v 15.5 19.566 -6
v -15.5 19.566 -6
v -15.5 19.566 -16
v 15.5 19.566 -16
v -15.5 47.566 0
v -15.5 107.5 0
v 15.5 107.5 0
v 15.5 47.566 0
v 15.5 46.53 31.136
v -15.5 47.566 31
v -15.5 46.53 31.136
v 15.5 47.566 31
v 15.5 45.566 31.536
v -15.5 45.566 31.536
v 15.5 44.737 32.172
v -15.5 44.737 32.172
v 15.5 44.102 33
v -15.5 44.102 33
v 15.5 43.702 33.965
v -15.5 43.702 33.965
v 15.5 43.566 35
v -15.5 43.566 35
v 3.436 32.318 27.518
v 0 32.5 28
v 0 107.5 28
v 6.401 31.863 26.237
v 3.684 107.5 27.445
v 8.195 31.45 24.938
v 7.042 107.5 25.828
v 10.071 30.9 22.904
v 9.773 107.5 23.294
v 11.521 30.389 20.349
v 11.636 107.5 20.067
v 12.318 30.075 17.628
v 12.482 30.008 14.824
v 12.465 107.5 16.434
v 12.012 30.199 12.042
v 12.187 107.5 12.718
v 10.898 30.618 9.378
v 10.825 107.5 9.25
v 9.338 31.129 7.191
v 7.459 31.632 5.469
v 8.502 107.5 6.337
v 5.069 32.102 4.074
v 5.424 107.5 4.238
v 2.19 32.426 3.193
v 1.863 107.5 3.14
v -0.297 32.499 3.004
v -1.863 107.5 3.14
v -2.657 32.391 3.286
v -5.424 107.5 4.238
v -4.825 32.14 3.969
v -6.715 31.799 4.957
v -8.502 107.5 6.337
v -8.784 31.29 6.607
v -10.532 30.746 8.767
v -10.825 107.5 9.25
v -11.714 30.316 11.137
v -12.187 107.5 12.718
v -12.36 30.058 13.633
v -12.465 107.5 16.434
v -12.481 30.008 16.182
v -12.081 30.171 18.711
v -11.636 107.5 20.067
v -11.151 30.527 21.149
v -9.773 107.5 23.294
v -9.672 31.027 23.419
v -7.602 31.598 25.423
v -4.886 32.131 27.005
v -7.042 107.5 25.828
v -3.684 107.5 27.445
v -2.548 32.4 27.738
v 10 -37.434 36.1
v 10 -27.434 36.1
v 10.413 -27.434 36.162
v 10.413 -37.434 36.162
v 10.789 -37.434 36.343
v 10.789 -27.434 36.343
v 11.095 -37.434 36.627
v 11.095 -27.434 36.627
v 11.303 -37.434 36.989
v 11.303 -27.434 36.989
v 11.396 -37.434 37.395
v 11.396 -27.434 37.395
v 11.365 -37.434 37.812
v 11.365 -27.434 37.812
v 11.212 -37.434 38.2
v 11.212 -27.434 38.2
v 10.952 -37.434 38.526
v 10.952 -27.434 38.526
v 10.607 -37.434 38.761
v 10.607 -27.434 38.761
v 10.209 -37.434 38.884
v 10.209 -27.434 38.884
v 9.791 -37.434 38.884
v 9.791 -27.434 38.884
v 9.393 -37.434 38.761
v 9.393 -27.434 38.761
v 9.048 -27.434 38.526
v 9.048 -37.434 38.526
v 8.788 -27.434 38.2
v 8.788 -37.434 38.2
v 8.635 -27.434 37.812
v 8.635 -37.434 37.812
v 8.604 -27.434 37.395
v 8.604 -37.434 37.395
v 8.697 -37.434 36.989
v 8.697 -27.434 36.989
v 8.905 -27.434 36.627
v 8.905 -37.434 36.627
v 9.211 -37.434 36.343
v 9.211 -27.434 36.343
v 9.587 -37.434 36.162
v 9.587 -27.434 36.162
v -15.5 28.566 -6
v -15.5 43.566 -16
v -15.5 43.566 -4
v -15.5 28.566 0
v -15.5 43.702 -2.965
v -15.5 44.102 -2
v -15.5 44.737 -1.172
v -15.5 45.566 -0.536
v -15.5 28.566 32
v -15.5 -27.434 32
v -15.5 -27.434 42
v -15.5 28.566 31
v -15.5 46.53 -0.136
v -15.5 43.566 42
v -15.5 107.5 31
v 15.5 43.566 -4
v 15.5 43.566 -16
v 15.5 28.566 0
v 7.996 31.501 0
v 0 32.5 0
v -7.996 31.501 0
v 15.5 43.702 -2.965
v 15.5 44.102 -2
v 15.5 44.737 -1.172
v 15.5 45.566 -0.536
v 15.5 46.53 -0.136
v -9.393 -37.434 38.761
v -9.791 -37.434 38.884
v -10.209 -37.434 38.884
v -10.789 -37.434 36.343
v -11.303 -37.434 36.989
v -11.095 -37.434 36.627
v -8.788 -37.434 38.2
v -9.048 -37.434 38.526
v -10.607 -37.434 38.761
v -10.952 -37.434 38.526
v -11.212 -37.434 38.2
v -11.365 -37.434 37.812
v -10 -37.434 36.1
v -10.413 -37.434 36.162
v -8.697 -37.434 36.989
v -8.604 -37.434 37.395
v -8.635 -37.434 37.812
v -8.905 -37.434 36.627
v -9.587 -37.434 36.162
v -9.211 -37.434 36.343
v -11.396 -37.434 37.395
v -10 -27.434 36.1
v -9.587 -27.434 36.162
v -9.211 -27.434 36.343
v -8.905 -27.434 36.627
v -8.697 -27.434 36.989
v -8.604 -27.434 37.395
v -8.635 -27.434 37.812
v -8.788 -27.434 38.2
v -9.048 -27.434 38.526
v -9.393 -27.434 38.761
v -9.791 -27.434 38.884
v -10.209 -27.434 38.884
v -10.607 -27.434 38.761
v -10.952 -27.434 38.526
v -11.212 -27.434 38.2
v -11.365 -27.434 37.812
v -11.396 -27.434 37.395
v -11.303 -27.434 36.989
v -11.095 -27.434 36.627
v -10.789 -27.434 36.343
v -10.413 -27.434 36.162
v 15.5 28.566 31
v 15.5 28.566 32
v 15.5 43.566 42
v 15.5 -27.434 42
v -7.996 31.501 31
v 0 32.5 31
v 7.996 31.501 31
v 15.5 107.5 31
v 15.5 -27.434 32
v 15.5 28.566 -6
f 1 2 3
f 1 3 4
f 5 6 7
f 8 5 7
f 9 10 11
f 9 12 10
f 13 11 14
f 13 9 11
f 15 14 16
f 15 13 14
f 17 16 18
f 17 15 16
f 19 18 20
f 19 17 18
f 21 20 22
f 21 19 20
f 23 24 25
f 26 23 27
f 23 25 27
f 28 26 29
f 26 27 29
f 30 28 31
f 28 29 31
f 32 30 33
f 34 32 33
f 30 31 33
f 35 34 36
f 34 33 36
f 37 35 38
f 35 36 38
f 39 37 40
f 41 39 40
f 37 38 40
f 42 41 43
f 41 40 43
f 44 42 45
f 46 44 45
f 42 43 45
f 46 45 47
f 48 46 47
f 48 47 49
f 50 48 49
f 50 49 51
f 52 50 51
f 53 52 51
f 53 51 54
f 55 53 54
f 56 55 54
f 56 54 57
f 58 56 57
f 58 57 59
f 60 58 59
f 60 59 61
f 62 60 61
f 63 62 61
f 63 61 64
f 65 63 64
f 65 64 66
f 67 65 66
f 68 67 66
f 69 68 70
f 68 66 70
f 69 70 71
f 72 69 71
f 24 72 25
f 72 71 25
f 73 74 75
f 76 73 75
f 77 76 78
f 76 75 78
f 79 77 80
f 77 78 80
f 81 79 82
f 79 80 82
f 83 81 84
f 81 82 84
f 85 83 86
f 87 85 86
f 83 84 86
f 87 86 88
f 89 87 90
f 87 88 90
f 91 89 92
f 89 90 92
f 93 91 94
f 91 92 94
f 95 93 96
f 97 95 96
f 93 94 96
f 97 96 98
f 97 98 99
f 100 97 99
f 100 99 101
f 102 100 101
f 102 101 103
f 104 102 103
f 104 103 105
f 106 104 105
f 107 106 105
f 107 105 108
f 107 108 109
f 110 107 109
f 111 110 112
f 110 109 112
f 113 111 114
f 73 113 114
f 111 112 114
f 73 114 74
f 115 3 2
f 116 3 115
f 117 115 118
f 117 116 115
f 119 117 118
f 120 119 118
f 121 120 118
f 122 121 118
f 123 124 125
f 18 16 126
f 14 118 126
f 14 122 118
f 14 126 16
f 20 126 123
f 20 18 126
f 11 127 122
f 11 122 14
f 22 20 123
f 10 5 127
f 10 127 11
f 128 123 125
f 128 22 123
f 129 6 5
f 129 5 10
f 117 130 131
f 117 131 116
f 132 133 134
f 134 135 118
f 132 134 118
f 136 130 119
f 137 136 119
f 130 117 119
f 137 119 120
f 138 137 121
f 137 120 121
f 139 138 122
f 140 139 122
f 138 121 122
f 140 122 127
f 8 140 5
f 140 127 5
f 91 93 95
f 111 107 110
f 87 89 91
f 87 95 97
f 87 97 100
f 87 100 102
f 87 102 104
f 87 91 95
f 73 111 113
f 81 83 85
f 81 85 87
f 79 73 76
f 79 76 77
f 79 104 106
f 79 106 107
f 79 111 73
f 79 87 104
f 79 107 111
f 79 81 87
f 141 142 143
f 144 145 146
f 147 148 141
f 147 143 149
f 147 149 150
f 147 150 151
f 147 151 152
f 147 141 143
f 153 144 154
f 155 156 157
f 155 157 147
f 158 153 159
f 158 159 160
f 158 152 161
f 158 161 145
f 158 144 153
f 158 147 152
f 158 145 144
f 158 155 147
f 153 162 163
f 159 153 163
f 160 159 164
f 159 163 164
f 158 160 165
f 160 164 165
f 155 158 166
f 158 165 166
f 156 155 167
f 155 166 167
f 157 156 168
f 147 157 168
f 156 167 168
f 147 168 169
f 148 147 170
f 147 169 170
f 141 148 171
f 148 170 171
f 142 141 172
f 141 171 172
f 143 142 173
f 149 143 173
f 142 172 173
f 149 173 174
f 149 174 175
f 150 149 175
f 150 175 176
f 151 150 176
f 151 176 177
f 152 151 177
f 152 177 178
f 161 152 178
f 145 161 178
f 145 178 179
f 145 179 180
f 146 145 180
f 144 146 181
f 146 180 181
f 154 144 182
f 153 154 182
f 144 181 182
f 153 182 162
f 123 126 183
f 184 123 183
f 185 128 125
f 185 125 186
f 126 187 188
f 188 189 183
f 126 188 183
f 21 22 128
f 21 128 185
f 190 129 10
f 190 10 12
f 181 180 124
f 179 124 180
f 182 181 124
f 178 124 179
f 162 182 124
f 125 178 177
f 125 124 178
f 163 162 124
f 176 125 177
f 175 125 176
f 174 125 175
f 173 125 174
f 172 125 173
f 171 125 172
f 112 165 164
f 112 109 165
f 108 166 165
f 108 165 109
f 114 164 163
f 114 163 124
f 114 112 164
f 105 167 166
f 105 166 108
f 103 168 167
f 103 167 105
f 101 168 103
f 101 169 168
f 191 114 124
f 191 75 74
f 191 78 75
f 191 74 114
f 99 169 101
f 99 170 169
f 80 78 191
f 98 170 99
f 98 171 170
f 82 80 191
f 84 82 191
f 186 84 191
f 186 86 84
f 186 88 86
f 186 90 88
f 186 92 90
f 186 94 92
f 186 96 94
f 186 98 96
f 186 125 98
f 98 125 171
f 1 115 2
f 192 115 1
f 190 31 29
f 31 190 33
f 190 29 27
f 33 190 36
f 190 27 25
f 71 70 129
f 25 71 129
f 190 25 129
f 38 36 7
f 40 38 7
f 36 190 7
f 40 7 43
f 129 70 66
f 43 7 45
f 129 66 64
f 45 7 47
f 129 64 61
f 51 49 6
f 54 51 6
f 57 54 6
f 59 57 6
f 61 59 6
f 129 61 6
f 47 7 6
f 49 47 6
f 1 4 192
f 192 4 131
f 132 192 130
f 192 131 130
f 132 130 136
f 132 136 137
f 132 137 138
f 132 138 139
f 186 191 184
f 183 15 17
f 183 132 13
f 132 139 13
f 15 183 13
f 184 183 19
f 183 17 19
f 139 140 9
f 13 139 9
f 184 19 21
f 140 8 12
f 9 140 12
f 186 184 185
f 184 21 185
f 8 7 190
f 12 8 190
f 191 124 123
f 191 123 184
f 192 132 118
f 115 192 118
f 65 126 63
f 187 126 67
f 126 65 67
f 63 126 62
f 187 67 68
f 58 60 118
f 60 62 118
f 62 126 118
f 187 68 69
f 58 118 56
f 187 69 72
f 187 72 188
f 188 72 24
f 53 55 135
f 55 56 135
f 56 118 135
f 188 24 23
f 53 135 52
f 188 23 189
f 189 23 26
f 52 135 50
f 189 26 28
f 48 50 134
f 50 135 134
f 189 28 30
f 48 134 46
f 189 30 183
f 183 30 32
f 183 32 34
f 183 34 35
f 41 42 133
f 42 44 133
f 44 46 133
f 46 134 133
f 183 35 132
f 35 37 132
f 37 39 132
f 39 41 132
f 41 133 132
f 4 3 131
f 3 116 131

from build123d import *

# Parameters (mm, degrees)
BOSS_EXTRUDE1_DEPTH = 31
SKETCH3_R           = 12.5
CUT_EXTRUDE1_DEPTH  = 87.208303263
SKETCH4_W           = 31
SKETCH4_H           = 15
BOSS_EXTRUDE2_DEPTH = 11
SKETCH5_W           = 31
SKETCH5_H           = 10
BOSS_EXTRUDE3_DEPTH = 56
SKETCH6_R           = 1.4
BOSS_EXTRUDE4_DEPTH = 10
SKETCH7_W           = 31
SKETCH7_H           = 15
BOSS_EXTRUDE5_DEPTH = 16
SKETCH8_W           = 31
SKETCH8_H           = 10
BOSS_EXTRUDE6_DEPTH = 9
FILLET1_R           = 4


with BuildPart() as part:
    # Sketch1 → Boss-Extrude1 (new body)
    with BuildSketch(Plane.XY):
        with BuildLine():
            Line((-15.5, 107.5), (-15.5, 28.565713714))
            ThreePointArc((-15.5, 28.565713714), (0, 32.5), (15.5, 28.565713714))
            Line((15.5, 28.565713714), (15.5, 107.5))
            Line((15.5, 107.5), (-15.5, 107.5))
        make_face()
    extrude(amount=BOSS_EXTRUDE1_DEPTH)

    # Sketch3 → Cut-Extrude1 (cut, through all)
    with BuildSketch(Plane(origin=(0, 107.5, 0), x_dir=(1, 0, 0), z_dir=(0, 1, 0))):
        with Locations(Location((0, -15.5, 0), (0, 0, 270))):
            Circle(SKETCH3_R)
    extrude(amount=-CUT_EXTRUDE1_DEPTH, mode=Mode.SUBTRACT)

    # Sketch4 → Boss-Extrude2 (add)
    with BuildSketch(Plane.XY.offset(31)):
        with Locations((0, 36.065713714)):
            Rectangle(SKETCH4_W, SKETCH4_H)
    extrude(amount=BOSS_EXTRUDE2_DEPTH)

    # Sketch5 → Boss-Extrude3 (add)
    with BuildSketch(Plane.XZ.offset(-28.565713714)):
        with Locations((0, 37)):
            Rectangle(SKETCH5_W, SKETCH5_H)
    extrude(amount=BOSS_EXTRUDE3_DEPTH)

    # Sketch6 → Boss-Extrude4 (add)
    with BuildSketch(Plane.XZ.offset(27.434286286)):
        with Locations(Location((-10, 37.5, 0), (0, 0, 270))):
            Circle(SKETCH6_R)
        with Locations(Location((10, 37.5, 0), (0, 0, 270))):
            Circle(SKETCH6_R)
    extrude(amount=BOSS_EXTRUDE4_DEPTH)

    # Sketch7 → Boss-Extrude5 (add)
    with BuildSketch(Plane(origin=(0, 0, 0), x_dir=(-1, 0, 0), z_dir=(0, 0, -1))):
        with Locations((0, 36.065713714)):
            Rectangle(SKETCH7_W, SKETCH7_H)
    extrude(amount=BOSS_EXTRUDE5_DEPTH)

    # Sketch8 → Boss-Extrude6 (add)
    with BuildSketch(Plane.XZ.offset(-28.565713714)):
        with Locations((0, -11)):
            Rectangle(SKETCH8_W, SKETCH8_H)
    extrude(amount=BOSS_EXTRUDE6_DEPTH)

    # Fillet1
    fillet1_edges = [part.edges().sort_by_distance(p)[0] for p in [
        (0, 43.565713714, 31),
        (0, 43.565713714, 0),
    ]]
    fillet(fillet1_edges, radius=FILLET1_R)


solid = part.part
